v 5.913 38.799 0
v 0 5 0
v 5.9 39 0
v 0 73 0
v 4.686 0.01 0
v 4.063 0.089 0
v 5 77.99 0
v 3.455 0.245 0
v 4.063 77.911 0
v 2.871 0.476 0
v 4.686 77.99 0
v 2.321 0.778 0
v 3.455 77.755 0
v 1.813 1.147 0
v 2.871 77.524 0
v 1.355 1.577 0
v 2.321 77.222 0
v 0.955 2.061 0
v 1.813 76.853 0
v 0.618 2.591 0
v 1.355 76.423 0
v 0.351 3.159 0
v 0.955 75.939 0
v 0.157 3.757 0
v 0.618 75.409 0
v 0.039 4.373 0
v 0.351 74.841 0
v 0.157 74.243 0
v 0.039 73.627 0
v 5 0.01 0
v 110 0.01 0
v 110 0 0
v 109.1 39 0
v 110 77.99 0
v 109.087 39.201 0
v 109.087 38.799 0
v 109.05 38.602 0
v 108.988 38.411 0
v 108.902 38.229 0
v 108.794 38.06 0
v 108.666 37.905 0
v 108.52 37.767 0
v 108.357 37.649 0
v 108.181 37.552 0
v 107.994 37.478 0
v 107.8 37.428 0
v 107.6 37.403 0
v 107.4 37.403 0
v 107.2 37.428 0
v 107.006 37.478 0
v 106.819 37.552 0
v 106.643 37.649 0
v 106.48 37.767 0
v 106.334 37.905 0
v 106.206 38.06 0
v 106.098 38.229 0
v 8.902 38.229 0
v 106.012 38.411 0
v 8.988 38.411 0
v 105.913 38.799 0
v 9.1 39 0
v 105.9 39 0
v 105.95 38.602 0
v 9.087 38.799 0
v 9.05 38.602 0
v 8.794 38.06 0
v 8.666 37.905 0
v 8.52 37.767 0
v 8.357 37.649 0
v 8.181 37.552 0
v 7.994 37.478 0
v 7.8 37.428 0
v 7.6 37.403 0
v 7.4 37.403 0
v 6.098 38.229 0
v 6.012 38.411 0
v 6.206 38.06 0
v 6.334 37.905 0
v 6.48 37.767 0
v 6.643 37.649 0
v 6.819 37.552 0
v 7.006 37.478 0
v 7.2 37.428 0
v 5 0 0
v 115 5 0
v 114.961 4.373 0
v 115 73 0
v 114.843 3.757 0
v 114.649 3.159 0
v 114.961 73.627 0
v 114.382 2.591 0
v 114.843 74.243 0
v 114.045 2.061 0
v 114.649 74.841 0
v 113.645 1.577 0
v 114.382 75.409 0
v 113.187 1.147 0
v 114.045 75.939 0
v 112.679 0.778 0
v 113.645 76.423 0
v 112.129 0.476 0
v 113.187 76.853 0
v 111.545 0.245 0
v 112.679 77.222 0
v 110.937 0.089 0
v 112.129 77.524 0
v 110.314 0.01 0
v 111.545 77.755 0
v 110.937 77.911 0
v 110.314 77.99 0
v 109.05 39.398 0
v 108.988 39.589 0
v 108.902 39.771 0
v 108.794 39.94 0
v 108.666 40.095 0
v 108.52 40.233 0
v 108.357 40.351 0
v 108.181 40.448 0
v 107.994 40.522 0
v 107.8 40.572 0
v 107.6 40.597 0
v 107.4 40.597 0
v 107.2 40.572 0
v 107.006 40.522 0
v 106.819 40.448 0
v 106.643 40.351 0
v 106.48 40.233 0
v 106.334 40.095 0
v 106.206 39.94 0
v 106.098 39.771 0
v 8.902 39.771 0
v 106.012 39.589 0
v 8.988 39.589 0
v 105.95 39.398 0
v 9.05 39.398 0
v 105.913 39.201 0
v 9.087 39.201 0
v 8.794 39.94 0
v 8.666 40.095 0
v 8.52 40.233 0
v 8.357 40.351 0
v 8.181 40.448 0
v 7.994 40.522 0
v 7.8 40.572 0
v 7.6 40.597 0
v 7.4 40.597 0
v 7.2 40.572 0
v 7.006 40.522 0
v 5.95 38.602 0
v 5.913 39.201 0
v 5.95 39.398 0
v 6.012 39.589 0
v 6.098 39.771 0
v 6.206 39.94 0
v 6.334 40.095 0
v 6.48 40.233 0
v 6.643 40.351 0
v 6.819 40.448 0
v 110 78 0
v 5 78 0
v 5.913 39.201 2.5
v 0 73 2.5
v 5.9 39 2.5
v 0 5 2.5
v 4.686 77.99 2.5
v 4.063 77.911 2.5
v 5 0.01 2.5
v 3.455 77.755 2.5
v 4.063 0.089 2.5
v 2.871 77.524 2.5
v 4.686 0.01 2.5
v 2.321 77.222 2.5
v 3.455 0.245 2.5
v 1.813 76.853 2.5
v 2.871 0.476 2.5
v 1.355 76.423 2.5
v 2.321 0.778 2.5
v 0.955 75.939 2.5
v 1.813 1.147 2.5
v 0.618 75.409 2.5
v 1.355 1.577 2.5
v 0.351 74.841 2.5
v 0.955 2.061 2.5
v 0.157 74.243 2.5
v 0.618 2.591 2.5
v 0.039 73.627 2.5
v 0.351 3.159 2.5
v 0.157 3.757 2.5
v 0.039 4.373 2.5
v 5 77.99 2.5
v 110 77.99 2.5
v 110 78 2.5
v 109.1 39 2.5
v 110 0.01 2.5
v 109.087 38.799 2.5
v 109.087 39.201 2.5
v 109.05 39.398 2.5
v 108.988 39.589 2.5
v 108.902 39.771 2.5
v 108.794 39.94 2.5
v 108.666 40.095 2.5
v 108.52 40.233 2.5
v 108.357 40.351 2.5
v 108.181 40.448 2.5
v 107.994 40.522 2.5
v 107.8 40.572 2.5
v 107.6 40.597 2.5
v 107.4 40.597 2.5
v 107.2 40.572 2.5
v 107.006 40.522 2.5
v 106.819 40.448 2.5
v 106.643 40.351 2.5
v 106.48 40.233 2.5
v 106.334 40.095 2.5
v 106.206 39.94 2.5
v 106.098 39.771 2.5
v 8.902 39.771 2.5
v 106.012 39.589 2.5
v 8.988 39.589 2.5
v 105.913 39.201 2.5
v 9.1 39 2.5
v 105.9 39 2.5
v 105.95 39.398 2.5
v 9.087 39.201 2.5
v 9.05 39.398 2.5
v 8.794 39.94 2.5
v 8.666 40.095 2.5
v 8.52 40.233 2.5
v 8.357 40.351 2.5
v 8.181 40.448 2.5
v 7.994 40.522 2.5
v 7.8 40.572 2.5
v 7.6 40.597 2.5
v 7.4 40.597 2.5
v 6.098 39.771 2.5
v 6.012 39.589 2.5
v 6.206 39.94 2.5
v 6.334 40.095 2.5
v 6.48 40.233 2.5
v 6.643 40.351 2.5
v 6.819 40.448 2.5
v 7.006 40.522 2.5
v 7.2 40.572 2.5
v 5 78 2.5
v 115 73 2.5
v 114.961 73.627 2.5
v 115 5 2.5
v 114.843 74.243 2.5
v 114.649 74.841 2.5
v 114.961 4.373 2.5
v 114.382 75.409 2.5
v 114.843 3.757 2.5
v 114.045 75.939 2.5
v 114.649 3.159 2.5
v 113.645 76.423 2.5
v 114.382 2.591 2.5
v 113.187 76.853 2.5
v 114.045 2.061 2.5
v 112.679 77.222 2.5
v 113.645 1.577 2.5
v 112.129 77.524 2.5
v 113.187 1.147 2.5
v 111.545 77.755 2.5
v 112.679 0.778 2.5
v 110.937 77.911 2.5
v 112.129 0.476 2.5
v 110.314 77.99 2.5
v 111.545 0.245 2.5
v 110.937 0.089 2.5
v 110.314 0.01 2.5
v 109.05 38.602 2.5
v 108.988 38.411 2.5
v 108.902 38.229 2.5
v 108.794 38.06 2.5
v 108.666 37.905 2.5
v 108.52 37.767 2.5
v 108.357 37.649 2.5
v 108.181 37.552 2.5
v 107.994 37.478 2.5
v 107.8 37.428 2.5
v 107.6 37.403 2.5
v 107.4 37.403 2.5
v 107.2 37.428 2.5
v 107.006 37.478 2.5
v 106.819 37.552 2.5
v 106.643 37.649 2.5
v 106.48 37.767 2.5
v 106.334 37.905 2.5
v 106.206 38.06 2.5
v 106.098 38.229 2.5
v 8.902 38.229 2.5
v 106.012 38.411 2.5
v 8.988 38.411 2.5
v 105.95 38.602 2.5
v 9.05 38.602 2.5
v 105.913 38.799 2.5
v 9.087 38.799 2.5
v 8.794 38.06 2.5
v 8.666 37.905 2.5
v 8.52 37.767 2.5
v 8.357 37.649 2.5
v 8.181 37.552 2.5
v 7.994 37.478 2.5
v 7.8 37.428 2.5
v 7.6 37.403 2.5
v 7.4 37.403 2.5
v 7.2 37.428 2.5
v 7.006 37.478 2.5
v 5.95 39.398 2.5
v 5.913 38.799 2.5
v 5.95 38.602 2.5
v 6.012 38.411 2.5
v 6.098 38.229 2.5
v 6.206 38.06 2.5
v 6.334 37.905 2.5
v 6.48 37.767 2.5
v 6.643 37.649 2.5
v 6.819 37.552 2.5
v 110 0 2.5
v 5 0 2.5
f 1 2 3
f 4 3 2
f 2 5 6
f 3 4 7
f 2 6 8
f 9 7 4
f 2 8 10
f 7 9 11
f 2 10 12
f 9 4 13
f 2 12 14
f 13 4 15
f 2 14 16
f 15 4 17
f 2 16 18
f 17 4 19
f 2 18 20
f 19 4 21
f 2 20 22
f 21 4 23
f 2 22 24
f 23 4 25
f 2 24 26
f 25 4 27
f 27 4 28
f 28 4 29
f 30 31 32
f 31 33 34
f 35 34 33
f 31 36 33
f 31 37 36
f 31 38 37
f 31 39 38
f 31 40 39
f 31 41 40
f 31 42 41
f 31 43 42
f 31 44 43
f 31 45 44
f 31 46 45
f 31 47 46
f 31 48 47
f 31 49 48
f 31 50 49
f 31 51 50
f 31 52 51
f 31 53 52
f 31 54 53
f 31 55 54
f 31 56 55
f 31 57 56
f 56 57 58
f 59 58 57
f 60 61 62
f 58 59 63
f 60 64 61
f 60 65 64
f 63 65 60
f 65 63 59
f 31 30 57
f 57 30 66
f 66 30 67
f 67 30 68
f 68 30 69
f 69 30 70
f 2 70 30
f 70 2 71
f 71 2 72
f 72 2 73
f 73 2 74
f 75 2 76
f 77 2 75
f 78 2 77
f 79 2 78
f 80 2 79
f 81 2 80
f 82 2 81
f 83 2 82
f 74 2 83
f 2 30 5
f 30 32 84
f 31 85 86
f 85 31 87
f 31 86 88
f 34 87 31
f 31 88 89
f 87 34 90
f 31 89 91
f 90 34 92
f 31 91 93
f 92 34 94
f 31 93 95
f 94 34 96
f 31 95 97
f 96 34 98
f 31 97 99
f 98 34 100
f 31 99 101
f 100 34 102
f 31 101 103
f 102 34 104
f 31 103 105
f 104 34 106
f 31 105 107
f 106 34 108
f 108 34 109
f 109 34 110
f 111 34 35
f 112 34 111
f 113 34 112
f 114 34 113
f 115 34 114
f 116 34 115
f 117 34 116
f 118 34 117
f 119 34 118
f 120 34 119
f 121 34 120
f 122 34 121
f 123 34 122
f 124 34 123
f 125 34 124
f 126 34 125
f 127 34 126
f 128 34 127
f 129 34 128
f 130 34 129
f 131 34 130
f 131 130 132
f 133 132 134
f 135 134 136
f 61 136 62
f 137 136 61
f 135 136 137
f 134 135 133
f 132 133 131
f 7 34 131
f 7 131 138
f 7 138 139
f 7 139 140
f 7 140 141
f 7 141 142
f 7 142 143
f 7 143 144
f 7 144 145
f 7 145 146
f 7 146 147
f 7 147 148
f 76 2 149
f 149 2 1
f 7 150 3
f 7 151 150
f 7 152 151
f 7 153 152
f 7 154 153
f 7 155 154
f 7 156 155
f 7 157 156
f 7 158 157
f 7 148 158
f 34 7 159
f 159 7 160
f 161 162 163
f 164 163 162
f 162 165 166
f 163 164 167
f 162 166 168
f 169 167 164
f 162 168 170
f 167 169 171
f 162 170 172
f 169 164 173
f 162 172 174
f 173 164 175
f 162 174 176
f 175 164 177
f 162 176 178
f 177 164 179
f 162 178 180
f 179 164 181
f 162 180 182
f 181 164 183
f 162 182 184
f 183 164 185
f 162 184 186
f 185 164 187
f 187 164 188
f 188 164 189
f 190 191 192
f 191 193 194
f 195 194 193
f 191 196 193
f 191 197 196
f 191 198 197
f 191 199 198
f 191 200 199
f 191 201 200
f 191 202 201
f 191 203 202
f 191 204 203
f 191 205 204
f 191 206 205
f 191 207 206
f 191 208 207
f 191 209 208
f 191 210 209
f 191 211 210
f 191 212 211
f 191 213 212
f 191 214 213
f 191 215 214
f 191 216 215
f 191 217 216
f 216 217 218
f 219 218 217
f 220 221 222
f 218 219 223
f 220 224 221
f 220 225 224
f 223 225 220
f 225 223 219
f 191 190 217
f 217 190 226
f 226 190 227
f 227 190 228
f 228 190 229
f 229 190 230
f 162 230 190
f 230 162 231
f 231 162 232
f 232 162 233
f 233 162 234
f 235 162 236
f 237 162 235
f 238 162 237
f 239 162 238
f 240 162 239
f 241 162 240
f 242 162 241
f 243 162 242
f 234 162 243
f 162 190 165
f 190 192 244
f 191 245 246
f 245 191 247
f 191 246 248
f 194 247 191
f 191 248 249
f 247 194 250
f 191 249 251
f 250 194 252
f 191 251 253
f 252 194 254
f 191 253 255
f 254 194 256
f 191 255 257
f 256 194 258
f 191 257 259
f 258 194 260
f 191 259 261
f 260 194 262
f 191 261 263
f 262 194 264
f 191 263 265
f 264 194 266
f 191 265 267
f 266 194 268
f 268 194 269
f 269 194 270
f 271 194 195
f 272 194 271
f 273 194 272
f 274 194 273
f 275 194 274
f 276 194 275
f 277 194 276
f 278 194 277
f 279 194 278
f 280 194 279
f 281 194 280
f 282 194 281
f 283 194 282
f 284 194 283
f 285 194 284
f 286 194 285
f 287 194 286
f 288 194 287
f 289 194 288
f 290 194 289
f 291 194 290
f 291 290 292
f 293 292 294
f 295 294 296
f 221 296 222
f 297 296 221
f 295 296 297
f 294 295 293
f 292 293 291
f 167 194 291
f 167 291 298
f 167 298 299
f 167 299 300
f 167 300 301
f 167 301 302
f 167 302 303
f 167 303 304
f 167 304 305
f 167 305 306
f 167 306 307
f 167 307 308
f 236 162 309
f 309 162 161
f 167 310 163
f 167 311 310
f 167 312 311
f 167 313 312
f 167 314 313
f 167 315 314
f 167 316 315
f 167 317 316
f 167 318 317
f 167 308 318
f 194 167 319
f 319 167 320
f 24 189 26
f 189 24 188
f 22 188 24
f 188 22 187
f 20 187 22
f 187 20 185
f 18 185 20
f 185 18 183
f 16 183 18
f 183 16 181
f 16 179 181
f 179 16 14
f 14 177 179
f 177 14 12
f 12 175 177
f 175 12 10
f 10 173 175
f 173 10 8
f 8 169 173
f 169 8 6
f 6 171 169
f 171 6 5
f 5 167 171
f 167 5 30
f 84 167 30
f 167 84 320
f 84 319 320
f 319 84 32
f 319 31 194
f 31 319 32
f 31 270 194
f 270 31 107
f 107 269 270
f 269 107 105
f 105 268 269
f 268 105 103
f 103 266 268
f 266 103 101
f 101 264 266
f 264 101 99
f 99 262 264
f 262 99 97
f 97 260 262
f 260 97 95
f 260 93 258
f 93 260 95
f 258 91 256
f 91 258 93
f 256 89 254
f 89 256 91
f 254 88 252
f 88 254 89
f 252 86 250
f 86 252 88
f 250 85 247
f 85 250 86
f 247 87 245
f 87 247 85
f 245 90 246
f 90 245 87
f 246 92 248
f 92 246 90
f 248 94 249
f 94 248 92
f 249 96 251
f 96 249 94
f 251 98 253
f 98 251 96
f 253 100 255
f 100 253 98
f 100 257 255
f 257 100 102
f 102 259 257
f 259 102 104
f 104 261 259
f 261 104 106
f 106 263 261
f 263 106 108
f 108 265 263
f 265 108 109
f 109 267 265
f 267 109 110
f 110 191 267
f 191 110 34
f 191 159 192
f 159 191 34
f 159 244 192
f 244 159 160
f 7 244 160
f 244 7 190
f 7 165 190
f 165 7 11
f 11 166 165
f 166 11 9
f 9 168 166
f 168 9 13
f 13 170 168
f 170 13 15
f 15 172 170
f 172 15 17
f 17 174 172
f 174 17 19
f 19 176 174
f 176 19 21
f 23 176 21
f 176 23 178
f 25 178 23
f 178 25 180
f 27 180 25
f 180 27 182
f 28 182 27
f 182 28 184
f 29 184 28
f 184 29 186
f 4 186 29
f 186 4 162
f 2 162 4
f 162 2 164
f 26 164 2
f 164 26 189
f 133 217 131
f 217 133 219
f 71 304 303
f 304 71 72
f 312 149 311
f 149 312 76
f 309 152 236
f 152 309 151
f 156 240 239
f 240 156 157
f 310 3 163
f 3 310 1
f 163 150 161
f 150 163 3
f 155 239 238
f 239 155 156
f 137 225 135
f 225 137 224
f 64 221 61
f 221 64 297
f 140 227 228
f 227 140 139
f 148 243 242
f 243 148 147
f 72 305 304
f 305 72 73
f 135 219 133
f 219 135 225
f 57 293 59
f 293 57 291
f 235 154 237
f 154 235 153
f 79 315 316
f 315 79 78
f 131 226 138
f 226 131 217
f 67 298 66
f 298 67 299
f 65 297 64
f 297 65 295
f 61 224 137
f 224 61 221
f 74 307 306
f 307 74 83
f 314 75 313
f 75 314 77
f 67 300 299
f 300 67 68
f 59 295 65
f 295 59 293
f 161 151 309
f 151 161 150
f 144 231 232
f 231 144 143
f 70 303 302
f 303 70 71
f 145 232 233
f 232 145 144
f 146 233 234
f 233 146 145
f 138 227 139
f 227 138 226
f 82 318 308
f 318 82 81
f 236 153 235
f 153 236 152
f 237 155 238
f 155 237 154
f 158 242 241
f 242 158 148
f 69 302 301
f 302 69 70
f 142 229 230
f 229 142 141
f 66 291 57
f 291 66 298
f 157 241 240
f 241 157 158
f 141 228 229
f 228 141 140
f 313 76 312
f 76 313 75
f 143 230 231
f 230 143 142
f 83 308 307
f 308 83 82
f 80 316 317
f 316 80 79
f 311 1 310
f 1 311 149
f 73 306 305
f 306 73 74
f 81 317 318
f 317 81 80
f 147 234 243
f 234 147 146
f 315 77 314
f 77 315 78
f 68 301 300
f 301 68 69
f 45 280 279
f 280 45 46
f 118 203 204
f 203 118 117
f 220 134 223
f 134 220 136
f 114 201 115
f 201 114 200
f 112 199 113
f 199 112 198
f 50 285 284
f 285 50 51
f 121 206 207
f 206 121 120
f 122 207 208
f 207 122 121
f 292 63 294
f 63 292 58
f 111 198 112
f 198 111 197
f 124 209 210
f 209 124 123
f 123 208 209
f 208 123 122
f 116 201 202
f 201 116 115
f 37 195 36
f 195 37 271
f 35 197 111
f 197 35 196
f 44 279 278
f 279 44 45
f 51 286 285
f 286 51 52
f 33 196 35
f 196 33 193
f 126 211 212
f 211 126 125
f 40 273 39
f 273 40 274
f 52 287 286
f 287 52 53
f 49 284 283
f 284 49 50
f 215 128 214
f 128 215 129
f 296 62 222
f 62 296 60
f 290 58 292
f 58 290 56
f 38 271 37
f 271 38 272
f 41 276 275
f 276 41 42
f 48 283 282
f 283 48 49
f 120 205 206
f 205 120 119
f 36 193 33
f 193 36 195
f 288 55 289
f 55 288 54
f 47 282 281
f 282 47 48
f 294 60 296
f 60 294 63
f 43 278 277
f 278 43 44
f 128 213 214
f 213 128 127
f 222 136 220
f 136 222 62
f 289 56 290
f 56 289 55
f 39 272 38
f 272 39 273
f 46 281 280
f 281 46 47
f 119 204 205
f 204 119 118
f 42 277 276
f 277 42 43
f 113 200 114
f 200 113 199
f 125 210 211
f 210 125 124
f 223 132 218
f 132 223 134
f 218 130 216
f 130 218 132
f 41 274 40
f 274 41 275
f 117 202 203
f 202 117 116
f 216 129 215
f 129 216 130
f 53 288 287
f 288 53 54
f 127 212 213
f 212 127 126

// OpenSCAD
$fn=50;
module main()
{
	module roundedsquare(r,w,h)
	{
		union()
		{
			translate([r,r])circle(r=r);
			translate([r,w-r])circle(r=r);
			translate([h-r,r])circle(r=r);
			translate([h-r,w-r])circle(r=r);
			translate([0,r])square([h,w-(r*2)]);	
			translate([r,0])square([h-(r*2),w]);
		}	
	}
	
	difference()
	{
	linear_extrude(height=2.5) roundedsquare(r=5,w=78,h=115);
	translate([7.5,78/2,-5])cylinder(r=3.2/2,h=10);
	translate([115-7.5,78/2,-5])cylinder(r=3.2/2,h=10);
	}
}

main();
